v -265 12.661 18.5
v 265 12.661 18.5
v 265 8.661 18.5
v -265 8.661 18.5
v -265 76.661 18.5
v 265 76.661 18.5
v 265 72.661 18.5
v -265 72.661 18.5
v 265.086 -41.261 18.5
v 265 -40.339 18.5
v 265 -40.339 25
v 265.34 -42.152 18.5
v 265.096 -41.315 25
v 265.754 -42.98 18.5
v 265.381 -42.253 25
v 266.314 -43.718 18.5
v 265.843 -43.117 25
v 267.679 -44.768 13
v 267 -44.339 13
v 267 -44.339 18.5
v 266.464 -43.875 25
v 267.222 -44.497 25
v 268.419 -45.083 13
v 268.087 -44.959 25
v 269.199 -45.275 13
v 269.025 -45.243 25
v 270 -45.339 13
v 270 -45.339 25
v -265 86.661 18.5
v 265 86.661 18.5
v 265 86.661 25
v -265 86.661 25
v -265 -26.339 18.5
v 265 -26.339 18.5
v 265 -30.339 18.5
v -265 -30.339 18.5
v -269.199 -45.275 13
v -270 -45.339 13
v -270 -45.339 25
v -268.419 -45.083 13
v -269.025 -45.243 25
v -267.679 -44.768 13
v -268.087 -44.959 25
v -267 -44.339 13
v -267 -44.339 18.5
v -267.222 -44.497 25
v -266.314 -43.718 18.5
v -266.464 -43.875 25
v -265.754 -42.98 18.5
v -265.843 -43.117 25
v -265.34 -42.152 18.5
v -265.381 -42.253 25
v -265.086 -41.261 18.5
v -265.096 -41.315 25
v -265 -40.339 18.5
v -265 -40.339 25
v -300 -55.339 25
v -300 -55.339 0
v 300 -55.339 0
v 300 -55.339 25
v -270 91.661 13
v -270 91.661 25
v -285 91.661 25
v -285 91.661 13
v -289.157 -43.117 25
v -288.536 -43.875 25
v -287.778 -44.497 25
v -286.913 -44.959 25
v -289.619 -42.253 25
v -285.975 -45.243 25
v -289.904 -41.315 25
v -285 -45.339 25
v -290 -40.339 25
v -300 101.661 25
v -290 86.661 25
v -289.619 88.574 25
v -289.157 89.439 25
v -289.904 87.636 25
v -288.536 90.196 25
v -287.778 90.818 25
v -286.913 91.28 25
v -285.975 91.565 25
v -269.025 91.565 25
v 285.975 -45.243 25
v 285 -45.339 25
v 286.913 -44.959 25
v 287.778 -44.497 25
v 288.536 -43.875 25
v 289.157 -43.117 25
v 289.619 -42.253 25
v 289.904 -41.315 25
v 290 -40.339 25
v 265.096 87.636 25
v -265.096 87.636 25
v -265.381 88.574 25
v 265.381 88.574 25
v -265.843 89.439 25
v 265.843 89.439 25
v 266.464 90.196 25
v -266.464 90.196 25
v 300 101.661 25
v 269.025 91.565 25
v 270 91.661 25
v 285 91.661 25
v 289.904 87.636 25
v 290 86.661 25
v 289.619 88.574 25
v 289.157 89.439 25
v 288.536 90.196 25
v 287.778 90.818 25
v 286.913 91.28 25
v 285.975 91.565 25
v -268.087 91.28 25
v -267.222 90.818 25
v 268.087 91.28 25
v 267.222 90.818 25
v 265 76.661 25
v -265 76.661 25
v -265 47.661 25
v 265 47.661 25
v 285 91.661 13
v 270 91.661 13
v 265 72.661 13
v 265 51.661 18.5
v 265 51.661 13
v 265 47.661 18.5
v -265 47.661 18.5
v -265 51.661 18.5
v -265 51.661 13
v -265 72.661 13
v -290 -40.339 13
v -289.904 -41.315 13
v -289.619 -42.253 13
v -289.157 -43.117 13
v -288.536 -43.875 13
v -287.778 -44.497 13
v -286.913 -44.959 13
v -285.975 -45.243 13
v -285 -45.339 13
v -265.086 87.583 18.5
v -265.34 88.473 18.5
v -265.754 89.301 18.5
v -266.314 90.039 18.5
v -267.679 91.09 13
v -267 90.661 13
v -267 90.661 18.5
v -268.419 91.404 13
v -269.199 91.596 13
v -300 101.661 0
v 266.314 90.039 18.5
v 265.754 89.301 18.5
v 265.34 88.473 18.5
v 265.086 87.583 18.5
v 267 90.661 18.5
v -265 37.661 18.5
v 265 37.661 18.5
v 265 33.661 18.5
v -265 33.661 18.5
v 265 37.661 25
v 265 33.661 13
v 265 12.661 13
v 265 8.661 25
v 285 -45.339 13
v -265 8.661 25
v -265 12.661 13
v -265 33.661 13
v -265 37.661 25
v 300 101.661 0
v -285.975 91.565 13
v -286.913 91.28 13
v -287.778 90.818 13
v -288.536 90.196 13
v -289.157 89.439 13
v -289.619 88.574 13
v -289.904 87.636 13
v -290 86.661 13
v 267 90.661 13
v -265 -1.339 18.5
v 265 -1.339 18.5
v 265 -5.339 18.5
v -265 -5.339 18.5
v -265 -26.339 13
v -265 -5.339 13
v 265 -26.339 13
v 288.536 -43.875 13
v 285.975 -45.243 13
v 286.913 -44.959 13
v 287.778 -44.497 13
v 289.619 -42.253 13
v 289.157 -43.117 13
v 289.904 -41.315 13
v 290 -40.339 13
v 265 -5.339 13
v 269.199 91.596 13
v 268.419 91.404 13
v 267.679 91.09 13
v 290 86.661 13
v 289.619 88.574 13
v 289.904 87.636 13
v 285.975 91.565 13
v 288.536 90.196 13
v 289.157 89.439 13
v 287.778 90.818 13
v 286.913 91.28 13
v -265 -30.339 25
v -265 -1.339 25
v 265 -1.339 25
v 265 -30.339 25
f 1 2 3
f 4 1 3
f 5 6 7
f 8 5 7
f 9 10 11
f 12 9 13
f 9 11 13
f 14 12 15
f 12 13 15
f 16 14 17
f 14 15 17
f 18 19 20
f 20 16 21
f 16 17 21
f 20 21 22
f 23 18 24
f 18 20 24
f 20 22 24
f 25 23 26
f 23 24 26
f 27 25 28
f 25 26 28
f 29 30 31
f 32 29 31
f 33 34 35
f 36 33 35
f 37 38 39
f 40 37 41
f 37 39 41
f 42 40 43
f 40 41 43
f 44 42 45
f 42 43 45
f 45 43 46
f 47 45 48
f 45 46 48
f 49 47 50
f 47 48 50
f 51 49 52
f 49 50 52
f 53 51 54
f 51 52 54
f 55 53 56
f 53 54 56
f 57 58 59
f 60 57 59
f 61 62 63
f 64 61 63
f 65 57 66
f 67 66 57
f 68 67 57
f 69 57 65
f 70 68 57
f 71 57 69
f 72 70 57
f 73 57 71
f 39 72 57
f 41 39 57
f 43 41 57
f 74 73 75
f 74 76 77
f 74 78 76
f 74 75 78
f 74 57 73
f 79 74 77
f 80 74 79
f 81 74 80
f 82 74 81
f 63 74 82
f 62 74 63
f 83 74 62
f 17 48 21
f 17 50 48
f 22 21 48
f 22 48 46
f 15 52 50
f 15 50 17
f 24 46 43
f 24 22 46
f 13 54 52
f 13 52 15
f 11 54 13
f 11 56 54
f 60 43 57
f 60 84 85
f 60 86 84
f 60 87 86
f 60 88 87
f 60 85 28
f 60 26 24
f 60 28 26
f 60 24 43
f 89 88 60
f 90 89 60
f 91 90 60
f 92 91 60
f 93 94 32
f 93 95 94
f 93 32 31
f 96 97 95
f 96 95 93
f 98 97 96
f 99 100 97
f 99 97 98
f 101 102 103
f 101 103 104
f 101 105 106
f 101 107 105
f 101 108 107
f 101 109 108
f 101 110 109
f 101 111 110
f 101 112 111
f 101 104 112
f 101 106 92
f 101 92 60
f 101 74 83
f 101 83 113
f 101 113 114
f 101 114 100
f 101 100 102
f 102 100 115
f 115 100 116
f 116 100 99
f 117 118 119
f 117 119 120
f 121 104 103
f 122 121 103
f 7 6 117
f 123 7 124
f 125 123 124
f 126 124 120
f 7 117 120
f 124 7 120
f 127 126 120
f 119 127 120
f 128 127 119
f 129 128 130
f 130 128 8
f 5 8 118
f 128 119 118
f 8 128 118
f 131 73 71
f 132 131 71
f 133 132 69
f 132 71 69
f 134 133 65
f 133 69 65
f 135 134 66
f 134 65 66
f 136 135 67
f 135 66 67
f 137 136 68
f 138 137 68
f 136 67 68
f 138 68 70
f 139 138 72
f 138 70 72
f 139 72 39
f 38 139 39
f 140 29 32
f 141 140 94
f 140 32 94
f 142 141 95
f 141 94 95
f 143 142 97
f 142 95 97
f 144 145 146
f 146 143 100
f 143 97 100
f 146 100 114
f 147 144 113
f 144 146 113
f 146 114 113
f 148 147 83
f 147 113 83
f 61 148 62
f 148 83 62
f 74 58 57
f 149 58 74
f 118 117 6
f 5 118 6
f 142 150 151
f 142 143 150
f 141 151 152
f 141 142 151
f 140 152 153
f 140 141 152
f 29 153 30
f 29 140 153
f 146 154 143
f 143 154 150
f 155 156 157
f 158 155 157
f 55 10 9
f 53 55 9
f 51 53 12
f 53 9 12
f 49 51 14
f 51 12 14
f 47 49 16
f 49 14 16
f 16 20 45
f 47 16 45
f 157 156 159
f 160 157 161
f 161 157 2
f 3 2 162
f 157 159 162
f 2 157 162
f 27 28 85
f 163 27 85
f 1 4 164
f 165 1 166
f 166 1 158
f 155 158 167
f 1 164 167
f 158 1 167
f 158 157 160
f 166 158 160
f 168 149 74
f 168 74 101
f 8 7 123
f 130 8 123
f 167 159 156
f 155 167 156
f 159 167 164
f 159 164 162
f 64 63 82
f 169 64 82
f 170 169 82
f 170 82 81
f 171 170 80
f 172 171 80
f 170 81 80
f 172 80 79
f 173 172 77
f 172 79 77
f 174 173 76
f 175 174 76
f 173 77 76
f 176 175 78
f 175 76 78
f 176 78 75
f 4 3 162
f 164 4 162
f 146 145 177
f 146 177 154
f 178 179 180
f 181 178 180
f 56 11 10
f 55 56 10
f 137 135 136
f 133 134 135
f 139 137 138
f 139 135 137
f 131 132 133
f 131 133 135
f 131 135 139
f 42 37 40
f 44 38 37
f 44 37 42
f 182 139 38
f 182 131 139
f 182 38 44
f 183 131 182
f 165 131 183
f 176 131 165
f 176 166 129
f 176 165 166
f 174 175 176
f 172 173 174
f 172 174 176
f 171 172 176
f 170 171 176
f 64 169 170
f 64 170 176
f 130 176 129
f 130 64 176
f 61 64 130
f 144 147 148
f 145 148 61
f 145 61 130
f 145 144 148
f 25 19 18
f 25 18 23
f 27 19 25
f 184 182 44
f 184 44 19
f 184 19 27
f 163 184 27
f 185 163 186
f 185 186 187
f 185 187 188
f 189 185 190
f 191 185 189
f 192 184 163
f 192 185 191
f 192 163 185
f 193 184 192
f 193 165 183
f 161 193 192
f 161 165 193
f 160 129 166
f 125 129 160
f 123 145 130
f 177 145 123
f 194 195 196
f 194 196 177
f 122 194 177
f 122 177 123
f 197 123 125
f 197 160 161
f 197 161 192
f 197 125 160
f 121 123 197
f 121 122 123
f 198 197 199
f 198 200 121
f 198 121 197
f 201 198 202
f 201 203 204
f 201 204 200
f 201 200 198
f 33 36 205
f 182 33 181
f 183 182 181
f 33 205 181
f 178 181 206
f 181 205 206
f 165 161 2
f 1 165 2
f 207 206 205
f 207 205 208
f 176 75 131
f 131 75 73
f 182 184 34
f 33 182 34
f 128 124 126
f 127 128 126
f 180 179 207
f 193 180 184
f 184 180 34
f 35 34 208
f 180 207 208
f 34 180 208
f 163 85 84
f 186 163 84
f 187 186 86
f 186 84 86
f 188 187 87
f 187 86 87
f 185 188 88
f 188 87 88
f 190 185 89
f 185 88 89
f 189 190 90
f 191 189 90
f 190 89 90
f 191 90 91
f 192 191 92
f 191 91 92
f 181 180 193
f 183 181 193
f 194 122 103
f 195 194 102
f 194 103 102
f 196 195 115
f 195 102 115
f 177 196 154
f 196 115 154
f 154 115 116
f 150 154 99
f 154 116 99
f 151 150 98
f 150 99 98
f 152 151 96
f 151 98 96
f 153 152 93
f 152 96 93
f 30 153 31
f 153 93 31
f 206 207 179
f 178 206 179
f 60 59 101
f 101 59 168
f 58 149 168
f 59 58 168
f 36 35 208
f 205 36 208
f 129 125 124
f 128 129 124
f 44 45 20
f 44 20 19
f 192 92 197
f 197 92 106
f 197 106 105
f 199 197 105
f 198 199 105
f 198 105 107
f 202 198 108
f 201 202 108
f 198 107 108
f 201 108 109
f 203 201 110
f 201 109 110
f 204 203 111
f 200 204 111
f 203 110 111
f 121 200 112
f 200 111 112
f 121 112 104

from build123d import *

# Parameters (mm, degrees)
F0_W     = 600
F0_H     = 157
F1_DEPTH = 25
F3_DEPTH = 12
F5_DEPTH = 545
F6_DEPTH = 16


with BuildPart() as f1:
    # F0 (on Top) → F1 (new body)
    with BuildSketch(Plane.XY):
        with Locations((0, 23.160652)):
            Rectangle(F0_W, F0_H)
    extrude(amount=F1_DEPTH)

    # F2 (on face) → F3 (cut)
    with BuildSketch(Plane.XY.offset(25)):
        with BuildLine():
            Line((-270, 91.660652), (-285, 91.660652))
            ThreePointArc((-285, 91.660652), (-288.535534, 90.196186), (-290, 86.660652))
            Line((-290, 86.660652), (-290, -40.339348))
            ThreePointArc((-290, -40.339348), (-288.535534, -43.874882), (-285, -45.339348))
            Line((-285, -45.339348), (-270, -45.339348))
            ThreePointArc((-270, -45.339348), (-266.464466, -43.874882), (-265, -40.339348))
            Line((-265, -40.339348), (-265, 86.660652))
            ThreePointArc((-265, 86.660652), (-266.464466, 90.196186), (-270, 91.660652))
        make_face()
        with BuildLine():
            ThreePointArc((285, -45.339348), (288.535534, -43.874882), (290, -40.339348))
            Line((290, -40.339348), (290, 86.660652))
            ThreePointArc((290, 86.660652), (288.535534, 90.196186), (285, 91.660652))
            Line((285, 91.660652), (270, 91.660652))
            ThreePointArc((270, 91.660652), (266.464466, 90.196186), (265, 86.660652))
            Line((265, 86.660652), (265, -40.339348))
            ThreePointArc((265, -40.339348), (266.464466, -43.874882), (270, -45.339348))
            Line((270, -45.339348), (285, -45.339348))
        make_face()
    extrude(amount=-F3_DEPTH, mode=Mode.SUBTRACT)

    # F4 (on face) → F5 (cut)
    with BuildSketch(Plane.YZ.offset(265)):
        Polygon((-30.339348, 25), (-40.339348, 25), (-40.339348, 18.5), (-44.339348, 18.5), (-44.339348, 13), (-26.339348, 13), (-26.339348, 18.5), (-30.339348, 18.5), align=None)
        Polygon((-1.339348, 25), (-1.339348, 18.5), (-5.339348, 18.5), (-5.339348, 13), (12.660652, 13), (12.660652, 18.5), (8.660652, 18.5), (8.660652, 25), align=None)
        Polygon((37.660652, 25), (37.660652, 18.5), (33.660652, 18.5), (33.660652, 13), (51.660652, 13), (51.660652, 18.5), (47.660652, 18.5), (47.660652, 25), align=None)
        Polygon((76.660652, 25), (76.660652, 18.5), (72.660652, 18.5), (72.660652, 13), (90.660652, 13), (90.660652, 18.5), (86.660652, 18.5), (86.660652, 25), align=None)
    extrude(amount=-F5_DEPTH, mode=Mode.SUBTRACT)

    # F4 (on face) → F6 (cut)
    with BuildSketch(Plane.YZ.offset(265)):
        Polygon((-30.339348, 25), (-40.339348, 25), (-40.339348, 18.5), (-44.339348, 18.5), (-44.339348, 13), (-26.339348, 13), (-26.339348, 18.5), (-30.339348, 18.5), align=None)
        Polygon((-1.339348, 25), (-1.339348, 18.5), (-5.339348, 18.5), (-5.339348, 13), (12.660652, 13), (12.660652, 18.5), (8.660652, 18.5), (8.660652, 25), align=None)
        Polygon((37.660652, 25), (37.660652, 18.5), (33.660652, 18.5), (33.660652, 13), (51.660652, 13), (51.660652, 18.5), (47.660652, 18.5), (47.660652, 25), align=None)
        Polygon((76.660652, 25), (76.660652, 18.5), (72.660652, 18.5), (72.660652, 13), (90.660652, 13), (90.660652, 18.5), (86.660652, 18.5), (86.660652, 25), align=None)
    extrude(amount=F6_DEPTH, mode=Mode.SUBTRACT)


solid = f1.part
